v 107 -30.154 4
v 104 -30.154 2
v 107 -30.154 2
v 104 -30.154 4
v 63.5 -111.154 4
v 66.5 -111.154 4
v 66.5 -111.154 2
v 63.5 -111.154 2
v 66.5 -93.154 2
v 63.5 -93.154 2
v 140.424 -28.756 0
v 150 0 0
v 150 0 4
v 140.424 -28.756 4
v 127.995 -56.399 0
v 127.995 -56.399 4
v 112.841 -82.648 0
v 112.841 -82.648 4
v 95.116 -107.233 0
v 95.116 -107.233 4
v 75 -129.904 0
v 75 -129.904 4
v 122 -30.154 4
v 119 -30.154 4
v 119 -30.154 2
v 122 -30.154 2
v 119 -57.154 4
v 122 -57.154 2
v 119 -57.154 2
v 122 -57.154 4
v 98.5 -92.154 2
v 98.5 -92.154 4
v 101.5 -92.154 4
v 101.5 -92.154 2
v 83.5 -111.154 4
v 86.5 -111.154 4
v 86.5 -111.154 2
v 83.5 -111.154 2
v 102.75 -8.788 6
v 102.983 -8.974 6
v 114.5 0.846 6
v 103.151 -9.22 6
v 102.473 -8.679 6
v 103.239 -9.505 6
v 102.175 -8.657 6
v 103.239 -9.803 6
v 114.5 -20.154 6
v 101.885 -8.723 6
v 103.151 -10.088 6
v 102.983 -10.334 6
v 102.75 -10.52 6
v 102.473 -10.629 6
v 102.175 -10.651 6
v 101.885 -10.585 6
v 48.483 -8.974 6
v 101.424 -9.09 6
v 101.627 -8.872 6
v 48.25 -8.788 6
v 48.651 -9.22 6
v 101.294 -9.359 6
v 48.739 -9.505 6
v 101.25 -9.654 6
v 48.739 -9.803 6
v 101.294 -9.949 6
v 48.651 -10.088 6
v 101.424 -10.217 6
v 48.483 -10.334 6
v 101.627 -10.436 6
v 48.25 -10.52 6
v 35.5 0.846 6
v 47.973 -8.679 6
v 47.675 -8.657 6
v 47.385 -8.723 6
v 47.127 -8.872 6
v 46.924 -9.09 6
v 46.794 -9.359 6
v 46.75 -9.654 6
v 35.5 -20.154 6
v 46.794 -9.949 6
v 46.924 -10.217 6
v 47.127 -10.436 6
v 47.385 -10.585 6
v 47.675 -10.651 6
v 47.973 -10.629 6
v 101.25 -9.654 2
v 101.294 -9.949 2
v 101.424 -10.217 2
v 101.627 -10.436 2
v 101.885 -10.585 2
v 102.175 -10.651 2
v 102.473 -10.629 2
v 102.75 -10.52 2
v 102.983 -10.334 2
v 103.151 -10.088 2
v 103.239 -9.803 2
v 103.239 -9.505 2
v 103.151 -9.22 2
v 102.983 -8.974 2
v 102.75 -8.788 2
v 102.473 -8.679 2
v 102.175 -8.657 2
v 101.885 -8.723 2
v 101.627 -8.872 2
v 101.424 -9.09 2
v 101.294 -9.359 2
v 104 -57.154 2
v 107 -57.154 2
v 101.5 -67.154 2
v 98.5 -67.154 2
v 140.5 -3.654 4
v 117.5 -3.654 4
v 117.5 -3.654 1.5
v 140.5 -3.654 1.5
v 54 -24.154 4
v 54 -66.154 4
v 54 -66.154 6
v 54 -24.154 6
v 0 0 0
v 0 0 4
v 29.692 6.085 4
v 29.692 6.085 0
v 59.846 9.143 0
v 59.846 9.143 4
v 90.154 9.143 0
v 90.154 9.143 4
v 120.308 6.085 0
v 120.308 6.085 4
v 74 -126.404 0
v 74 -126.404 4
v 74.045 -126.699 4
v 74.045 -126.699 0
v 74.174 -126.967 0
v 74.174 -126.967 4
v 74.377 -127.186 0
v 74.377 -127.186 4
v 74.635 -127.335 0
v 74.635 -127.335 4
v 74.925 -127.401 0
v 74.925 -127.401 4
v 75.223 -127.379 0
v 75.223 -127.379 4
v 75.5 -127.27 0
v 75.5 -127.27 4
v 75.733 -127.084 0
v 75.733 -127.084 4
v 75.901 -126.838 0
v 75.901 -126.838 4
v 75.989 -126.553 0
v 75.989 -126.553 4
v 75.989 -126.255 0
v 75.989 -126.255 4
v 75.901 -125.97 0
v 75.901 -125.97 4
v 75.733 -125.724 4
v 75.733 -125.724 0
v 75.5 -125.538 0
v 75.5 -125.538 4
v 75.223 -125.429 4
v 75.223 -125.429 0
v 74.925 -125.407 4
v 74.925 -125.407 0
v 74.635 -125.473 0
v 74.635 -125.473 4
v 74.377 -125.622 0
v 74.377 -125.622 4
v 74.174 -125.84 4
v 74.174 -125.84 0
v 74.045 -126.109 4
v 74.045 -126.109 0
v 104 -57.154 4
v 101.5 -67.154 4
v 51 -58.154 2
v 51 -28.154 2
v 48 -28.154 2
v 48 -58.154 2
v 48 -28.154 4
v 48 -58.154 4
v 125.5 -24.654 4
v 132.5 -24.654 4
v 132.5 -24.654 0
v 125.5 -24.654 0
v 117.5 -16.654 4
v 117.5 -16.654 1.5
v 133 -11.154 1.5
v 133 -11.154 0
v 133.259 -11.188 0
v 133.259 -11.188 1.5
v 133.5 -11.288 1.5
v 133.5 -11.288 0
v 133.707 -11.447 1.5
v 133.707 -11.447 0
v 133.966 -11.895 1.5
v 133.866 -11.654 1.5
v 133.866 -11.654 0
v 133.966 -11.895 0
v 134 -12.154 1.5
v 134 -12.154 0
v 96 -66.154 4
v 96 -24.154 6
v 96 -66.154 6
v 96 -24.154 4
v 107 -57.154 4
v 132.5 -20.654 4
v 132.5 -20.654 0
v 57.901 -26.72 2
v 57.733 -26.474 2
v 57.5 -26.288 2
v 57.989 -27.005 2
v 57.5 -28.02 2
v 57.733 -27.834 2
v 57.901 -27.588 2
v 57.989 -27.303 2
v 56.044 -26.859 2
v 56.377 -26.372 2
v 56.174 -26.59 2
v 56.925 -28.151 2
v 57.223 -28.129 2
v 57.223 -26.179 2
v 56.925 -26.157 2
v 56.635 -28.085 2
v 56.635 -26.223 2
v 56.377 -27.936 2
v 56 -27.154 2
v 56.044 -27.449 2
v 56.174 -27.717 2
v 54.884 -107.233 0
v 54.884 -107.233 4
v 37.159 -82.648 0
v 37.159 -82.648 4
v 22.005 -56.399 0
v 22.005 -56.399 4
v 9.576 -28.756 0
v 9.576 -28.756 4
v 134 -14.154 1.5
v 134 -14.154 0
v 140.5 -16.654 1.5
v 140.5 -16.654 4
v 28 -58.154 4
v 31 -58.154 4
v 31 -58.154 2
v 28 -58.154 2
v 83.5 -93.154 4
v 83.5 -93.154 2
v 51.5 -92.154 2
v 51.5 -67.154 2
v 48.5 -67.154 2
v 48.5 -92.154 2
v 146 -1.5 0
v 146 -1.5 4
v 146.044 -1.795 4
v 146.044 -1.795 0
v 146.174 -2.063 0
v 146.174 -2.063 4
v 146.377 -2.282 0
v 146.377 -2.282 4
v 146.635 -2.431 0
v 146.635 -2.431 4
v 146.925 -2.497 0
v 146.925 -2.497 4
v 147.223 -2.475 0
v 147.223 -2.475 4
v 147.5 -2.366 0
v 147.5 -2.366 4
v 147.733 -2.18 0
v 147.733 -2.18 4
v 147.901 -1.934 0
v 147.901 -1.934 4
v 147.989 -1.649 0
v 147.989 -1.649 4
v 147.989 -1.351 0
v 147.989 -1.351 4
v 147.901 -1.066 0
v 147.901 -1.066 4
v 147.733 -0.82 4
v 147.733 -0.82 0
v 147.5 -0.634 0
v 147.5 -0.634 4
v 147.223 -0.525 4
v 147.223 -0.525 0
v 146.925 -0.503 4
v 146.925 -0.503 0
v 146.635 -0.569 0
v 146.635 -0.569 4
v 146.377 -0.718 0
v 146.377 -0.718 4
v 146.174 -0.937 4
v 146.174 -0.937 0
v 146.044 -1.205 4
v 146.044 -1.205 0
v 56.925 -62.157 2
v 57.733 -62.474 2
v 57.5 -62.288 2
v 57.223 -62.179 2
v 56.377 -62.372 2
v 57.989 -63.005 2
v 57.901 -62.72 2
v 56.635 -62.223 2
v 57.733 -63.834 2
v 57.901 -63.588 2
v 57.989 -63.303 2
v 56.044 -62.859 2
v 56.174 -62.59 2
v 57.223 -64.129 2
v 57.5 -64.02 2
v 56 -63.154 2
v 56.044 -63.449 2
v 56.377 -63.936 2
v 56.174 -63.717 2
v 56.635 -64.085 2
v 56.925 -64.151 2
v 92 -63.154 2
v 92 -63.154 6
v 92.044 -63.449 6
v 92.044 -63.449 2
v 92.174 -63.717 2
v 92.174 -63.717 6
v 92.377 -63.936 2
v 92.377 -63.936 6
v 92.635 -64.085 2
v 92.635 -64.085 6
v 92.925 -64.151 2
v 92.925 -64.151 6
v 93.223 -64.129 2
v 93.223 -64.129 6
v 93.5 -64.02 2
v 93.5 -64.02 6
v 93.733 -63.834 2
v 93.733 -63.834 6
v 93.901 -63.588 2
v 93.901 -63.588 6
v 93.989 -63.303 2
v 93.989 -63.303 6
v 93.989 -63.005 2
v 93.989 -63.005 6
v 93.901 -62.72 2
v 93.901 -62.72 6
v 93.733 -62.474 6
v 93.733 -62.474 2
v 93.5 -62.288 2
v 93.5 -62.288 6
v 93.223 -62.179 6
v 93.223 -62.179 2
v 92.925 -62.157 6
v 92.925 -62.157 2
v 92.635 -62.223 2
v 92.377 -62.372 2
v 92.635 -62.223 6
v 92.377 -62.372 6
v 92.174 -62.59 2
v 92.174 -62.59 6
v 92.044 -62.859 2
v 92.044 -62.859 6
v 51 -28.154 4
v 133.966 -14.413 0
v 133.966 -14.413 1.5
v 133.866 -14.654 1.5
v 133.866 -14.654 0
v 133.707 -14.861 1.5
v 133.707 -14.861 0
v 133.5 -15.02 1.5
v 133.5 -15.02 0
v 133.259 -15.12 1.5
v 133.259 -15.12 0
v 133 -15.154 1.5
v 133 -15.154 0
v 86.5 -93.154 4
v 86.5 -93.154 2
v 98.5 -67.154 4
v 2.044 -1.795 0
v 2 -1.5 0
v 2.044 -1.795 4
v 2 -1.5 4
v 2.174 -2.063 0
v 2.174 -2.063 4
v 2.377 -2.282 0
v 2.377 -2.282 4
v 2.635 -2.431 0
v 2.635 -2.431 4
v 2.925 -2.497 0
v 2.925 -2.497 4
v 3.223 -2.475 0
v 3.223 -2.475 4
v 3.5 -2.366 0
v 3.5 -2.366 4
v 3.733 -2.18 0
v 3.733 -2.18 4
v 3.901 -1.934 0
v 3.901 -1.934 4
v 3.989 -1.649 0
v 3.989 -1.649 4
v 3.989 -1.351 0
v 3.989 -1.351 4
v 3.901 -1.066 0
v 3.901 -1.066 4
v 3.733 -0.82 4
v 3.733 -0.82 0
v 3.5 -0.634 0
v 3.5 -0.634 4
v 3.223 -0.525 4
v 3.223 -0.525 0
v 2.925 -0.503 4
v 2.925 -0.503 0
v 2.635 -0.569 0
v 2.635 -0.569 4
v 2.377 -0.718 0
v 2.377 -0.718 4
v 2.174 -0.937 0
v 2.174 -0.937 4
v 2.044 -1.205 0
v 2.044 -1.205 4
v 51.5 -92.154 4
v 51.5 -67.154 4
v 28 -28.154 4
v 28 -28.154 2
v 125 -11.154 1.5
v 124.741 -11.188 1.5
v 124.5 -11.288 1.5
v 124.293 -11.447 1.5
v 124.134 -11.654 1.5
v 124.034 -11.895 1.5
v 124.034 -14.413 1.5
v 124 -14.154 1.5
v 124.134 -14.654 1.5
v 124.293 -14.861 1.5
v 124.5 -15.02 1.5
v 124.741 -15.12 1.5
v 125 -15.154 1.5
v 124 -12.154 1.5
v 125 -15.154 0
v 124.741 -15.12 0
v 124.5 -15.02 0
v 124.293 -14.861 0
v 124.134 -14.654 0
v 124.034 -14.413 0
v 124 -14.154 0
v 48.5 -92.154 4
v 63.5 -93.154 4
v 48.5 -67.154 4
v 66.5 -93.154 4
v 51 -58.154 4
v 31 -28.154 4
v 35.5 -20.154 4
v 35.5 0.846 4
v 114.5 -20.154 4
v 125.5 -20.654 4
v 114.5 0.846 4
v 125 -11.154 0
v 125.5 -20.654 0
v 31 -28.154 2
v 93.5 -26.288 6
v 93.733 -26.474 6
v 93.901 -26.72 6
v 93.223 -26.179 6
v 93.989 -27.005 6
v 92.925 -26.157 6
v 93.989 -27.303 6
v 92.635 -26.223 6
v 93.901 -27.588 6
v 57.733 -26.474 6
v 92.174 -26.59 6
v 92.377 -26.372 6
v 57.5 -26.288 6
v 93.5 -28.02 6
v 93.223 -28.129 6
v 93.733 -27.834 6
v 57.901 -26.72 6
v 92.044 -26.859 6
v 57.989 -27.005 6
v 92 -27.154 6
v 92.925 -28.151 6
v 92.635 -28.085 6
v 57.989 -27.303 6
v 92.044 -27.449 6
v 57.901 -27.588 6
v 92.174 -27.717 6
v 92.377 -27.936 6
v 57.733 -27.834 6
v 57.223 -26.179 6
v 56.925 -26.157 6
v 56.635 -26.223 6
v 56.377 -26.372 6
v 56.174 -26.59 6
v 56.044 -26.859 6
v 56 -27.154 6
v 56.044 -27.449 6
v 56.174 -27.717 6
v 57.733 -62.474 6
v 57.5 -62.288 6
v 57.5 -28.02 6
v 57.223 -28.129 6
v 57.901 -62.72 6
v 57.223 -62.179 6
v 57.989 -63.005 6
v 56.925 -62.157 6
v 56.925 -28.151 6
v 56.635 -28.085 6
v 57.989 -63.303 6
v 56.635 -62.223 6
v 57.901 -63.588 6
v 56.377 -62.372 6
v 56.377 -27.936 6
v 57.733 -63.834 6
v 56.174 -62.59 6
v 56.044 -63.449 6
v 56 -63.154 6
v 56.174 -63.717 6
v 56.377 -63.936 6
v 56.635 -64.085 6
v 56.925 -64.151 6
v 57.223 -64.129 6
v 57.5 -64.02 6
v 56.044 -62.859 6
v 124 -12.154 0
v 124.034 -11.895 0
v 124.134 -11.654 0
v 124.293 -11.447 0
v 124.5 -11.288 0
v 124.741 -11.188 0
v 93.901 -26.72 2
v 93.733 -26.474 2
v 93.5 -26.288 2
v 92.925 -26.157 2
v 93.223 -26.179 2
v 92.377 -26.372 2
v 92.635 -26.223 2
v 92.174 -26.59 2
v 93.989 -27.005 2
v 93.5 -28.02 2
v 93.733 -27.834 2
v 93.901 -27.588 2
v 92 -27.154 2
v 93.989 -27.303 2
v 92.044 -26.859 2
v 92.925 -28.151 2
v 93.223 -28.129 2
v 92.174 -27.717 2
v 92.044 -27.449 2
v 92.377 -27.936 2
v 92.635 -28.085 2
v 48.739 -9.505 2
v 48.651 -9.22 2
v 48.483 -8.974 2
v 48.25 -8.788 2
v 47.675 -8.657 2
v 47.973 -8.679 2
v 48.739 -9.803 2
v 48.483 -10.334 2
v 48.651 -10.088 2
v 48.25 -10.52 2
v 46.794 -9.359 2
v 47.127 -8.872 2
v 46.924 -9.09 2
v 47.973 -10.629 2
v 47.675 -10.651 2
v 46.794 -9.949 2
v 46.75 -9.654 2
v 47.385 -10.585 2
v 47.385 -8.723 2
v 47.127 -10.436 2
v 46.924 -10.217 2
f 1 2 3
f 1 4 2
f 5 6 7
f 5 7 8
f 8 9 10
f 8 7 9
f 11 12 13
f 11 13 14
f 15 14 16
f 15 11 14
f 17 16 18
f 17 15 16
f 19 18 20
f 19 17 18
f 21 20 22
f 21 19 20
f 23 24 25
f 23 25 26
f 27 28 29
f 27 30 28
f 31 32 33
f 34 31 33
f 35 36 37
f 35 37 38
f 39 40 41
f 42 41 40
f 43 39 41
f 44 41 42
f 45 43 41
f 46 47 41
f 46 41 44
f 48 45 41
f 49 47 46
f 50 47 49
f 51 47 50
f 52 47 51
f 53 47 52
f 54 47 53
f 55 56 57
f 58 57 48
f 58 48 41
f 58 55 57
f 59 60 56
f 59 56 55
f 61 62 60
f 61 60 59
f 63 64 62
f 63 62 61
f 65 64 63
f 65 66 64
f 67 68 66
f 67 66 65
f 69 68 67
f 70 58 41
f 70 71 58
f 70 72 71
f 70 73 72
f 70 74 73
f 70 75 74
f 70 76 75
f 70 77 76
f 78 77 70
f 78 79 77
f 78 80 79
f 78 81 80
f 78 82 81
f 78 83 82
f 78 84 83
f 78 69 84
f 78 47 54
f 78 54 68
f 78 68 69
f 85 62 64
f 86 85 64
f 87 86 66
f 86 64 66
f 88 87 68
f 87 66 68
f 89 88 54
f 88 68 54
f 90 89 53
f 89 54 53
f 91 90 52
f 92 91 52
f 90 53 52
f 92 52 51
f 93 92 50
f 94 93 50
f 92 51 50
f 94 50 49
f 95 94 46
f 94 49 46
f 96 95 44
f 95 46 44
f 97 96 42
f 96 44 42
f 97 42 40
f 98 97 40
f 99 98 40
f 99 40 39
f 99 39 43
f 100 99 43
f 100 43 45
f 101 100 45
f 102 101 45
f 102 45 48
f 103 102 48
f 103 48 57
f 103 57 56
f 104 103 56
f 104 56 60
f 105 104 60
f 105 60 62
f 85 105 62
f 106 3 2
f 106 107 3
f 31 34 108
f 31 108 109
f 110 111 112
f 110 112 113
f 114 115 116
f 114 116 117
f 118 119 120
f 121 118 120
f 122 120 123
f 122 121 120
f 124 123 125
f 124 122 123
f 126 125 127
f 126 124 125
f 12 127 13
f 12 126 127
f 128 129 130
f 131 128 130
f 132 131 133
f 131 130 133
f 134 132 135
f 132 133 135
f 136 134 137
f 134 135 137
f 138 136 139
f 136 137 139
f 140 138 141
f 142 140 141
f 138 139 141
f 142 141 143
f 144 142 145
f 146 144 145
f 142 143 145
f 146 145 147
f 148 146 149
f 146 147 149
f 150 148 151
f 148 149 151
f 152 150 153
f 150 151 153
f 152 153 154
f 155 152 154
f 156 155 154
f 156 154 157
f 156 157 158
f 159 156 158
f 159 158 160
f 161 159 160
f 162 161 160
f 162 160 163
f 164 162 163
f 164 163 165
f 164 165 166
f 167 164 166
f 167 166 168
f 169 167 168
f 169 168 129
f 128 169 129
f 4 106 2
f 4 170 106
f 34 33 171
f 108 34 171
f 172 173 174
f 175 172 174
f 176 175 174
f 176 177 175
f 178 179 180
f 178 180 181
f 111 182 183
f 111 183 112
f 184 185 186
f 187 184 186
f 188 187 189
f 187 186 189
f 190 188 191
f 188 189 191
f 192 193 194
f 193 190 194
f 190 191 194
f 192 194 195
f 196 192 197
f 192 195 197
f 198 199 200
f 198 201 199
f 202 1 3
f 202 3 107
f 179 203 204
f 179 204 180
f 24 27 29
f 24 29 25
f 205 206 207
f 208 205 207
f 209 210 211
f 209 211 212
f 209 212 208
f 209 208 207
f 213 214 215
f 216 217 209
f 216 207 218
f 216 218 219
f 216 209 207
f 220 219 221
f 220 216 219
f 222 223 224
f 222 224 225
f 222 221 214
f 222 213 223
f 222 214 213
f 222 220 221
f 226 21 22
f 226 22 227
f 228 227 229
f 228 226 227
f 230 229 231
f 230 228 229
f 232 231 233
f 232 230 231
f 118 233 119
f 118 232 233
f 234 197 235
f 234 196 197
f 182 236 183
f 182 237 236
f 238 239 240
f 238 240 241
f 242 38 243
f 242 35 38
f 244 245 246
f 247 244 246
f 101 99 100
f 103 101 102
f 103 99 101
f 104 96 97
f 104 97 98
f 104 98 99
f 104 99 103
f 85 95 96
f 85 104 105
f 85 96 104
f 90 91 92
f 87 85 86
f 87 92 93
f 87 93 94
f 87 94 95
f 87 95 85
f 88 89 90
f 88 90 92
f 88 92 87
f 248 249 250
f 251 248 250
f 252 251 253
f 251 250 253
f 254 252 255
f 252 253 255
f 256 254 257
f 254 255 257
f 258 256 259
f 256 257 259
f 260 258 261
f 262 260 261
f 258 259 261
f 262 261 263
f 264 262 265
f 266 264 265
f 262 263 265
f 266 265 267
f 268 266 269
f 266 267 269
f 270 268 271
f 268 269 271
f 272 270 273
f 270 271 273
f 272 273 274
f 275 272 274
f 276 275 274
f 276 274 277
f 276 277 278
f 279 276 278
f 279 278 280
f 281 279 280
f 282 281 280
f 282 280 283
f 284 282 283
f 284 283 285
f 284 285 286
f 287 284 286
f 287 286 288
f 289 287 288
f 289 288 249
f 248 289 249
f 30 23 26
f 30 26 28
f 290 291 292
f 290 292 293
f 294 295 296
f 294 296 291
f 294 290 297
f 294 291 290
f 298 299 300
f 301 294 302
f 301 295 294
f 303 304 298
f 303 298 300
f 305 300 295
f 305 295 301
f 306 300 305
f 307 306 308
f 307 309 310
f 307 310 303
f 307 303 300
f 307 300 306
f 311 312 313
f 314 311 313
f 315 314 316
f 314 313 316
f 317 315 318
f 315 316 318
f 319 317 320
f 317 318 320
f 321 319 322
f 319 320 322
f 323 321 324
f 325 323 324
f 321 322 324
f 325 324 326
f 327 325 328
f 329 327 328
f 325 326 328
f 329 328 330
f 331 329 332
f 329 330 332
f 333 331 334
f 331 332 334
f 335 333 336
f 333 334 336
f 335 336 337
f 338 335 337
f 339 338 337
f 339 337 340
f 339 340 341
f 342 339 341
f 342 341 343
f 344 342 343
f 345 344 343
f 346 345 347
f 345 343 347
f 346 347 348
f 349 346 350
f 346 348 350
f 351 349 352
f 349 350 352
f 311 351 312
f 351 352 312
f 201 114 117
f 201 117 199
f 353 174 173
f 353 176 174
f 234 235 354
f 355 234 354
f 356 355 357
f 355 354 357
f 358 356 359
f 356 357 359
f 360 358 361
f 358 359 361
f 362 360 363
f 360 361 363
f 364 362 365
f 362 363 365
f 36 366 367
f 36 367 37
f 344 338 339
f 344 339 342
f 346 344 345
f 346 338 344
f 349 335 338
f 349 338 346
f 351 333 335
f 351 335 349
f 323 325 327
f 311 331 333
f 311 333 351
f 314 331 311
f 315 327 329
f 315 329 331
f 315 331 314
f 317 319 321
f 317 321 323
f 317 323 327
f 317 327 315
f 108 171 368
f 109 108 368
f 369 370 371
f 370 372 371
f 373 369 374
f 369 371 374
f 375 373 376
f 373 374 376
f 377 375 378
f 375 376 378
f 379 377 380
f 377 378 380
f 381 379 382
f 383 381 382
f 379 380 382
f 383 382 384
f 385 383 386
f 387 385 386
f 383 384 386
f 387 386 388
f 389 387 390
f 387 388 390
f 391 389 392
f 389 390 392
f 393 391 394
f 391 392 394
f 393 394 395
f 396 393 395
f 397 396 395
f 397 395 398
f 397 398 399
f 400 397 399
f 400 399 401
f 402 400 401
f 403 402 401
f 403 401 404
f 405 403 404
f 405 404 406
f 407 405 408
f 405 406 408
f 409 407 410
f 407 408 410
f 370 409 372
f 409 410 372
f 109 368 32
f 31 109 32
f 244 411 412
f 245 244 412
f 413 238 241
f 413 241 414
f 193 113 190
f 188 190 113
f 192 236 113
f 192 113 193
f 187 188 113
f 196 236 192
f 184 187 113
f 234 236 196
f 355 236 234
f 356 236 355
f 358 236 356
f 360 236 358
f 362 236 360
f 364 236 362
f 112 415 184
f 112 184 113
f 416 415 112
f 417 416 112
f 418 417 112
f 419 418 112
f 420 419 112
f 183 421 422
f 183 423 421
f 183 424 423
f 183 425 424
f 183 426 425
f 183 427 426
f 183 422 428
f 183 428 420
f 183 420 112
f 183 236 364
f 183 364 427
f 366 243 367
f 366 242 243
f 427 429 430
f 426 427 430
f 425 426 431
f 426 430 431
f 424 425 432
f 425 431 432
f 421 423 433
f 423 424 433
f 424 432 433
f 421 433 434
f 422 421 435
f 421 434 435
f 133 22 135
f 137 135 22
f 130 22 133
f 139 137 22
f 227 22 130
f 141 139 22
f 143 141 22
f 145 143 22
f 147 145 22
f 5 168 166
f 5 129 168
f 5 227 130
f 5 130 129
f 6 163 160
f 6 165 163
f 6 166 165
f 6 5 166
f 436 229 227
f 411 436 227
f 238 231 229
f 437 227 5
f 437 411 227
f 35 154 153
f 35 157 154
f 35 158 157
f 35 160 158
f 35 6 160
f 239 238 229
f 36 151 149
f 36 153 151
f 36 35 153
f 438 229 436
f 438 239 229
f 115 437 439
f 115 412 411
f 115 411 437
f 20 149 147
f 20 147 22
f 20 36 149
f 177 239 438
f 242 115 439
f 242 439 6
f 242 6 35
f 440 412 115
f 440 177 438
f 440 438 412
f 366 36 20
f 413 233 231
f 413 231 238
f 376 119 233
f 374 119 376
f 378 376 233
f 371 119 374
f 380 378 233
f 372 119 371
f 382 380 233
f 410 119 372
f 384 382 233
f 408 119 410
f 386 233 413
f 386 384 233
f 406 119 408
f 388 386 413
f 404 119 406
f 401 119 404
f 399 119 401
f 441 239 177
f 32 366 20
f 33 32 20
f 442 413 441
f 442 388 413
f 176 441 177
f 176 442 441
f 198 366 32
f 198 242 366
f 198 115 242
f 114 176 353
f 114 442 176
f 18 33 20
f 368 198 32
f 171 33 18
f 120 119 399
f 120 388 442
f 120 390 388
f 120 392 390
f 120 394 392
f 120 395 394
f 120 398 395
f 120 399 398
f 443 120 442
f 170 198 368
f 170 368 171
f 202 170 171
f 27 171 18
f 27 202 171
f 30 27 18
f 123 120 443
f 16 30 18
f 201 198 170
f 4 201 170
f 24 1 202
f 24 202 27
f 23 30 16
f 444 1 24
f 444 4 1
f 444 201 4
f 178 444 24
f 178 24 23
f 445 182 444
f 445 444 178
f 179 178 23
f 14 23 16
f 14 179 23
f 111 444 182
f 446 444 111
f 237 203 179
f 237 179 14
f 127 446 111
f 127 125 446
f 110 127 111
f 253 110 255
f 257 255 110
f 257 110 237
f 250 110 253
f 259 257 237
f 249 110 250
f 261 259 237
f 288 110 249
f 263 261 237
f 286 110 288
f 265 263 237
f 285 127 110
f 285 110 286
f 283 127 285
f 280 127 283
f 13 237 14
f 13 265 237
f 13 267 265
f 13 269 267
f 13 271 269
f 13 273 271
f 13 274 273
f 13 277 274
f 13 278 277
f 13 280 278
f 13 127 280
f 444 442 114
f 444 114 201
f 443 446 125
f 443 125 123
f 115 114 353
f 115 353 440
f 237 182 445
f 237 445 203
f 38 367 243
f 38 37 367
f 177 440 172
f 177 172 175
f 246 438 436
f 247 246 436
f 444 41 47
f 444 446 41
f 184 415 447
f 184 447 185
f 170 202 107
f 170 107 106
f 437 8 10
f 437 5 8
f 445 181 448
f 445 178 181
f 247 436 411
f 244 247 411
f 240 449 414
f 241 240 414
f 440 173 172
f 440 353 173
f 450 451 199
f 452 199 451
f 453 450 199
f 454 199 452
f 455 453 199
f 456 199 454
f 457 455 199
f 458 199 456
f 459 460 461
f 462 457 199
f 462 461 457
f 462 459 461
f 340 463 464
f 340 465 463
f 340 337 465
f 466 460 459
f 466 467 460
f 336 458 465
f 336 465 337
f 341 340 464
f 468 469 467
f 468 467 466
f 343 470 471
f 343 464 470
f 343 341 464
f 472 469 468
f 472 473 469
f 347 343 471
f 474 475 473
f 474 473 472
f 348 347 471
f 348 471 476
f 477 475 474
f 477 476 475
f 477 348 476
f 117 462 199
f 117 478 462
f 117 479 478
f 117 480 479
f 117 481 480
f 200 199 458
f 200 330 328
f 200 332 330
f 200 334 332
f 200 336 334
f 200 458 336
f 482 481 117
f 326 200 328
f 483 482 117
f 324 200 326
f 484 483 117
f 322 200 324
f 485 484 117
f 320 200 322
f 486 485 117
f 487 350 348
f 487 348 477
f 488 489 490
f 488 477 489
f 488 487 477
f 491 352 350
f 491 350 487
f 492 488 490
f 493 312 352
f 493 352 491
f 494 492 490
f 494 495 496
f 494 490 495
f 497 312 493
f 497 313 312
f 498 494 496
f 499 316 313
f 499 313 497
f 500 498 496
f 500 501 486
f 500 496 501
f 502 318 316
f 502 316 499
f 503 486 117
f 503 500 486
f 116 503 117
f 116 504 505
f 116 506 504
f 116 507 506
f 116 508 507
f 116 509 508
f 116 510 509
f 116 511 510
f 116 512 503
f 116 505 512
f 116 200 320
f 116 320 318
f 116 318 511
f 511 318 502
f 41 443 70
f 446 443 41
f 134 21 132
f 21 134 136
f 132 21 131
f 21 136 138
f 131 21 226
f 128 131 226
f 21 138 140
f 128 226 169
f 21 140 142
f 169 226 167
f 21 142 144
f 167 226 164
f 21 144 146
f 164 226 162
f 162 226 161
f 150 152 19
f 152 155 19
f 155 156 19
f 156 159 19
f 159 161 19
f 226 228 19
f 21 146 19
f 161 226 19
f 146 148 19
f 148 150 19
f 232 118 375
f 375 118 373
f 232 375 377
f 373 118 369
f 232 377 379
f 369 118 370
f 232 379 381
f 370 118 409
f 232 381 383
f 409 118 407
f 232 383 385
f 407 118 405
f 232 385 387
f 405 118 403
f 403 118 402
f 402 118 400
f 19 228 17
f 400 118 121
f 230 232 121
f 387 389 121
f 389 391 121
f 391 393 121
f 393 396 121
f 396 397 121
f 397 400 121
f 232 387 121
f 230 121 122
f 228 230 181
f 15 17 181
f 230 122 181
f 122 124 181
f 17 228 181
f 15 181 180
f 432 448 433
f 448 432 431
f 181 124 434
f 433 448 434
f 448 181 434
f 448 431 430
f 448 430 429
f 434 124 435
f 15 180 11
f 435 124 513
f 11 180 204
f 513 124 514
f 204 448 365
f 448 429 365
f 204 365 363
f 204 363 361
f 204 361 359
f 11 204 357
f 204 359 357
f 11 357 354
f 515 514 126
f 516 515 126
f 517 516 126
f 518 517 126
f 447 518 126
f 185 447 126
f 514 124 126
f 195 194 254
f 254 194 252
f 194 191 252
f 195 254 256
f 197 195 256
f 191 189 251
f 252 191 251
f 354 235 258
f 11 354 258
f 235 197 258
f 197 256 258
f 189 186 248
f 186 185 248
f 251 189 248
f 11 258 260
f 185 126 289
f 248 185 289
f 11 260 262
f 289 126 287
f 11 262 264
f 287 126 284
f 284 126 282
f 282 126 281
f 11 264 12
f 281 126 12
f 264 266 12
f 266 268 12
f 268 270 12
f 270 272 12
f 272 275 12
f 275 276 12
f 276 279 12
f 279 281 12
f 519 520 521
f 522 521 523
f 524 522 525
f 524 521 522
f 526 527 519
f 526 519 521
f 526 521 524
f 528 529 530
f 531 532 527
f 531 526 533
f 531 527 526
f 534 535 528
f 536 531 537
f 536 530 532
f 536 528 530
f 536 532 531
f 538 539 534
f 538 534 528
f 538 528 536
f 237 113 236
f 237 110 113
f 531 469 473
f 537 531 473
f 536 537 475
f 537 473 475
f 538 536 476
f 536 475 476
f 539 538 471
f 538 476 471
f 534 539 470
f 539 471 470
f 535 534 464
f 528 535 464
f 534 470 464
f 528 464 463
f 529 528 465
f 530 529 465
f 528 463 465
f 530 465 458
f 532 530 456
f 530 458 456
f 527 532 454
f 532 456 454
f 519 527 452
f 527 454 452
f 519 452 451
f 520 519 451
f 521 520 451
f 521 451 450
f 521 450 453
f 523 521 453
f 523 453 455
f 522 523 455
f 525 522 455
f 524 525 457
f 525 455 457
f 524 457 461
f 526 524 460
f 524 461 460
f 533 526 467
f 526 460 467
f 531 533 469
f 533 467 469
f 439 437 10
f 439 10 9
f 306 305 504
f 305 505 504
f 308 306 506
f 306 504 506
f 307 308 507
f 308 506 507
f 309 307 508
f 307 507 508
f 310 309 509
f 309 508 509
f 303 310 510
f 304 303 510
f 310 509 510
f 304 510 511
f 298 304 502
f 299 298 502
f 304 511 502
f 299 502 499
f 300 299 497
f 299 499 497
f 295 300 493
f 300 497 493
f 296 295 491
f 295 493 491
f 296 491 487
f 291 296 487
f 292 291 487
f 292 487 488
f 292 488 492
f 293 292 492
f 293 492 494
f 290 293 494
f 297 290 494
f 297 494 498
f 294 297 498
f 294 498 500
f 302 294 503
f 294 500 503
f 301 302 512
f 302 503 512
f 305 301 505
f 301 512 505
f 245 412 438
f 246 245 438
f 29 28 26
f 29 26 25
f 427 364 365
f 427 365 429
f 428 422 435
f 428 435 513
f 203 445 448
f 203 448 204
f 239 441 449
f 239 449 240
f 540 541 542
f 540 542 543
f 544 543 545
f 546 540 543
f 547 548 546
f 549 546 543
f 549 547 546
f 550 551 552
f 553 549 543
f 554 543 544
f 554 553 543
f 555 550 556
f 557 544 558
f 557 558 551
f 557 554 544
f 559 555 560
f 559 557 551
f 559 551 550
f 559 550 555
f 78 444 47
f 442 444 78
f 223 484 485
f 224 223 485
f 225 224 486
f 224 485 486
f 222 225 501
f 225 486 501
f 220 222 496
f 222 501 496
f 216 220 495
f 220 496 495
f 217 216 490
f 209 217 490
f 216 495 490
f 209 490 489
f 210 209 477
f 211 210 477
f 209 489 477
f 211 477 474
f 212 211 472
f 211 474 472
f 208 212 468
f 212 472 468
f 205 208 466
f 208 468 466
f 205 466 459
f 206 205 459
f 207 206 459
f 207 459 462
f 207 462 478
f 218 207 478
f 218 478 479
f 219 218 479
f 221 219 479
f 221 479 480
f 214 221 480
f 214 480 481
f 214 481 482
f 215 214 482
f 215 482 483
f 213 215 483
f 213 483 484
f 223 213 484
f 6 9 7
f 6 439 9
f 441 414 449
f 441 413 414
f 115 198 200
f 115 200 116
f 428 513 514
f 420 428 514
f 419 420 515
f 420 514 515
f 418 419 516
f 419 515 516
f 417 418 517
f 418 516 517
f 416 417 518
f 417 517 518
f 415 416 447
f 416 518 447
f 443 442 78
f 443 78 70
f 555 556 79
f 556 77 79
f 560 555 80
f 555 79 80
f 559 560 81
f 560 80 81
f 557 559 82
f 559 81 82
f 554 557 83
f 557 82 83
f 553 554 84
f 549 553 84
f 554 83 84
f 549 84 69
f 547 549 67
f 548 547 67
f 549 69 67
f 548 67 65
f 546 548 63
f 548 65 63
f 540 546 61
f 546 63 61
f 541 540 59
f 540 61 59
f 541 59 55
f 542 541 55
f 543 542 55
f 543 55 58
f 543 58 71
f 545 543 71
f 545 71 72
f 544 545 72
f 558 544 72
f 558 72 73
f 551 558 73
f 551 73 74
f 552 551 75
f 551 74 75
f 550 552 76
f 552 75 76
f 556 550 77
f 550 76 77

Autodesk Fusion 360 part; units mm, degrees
sketch "Base" plane through (0, 0, 0) normal (0, 0, 1) x (1, 0, 0)
  line L0 (0, 0) -> (150, 0)
  line L1 (150, 0) -> (75, -129.9038)
  line L2 (75, -129.9038) -> (0, 0)
  arc A0 (150, 0) -> (0, 0) centre (75, -290.4738) ccw
  arc A1 (0, 0) -> (75, -129.9038) centre (289.0576, 80.285) ccw
  arc A2 (75, -129.9038) -> (150, 0) centre (-139.0576, 80.285) ccw
  dimension "d1" = 150
  dimension "d2" = 150
  dimension "d3" = 150
  dimension "d4" = 300
  dimension "d5" = 300
  dimension "d6" = 300
extrude "Extrude1" add sketch "Base" along normal blind 4
sketch "Pads" plane through (0, 0, 4) normal (0, 0, 1) x (-1, 0, 0)
  arc A0 (-75, 129.9038) -> (-150, 0) centre (139.0576, -80.285) ccw
  arc A1 (-150, 0) -> (0, 0) centre (-75, 290.4738) ccw
  arc A2 (0, 0) -> (-75, 129.9038) centre (-289.0576, -80.285) ccw
  line L0 (-54, 24.1538) -> (-96, 24.1538)
  line L1 (-96, 24.1538) -> (-96, 66.1538)
  line L2 (-96, 66.1538) -> (-54, 66.1538)
  line L3 (-54, 66.1538) -> (-54, 24.1538)
  line L4 (-114.5, 20.1538) -> (-35.5, 20.1538)
  line L5 (-35.5, 20.1538) -> (-35.5, -0.8462)
  line L6 (-35.5, -0.8462) -> (-114.5, -0.8462)
  line L7 (-114.5, -0.8462) -> (-114.5, 20.1538)
  dimension "d478" = 42
  dimension "d479" = 42
  dimension "d480" = 63.75
  dimension "d481" = 54
  dimension "d496" = 79
  dimension "d497" = 21
  dimension "d498" = 18.5
  dimension "d499" = 4
extrude "Extrude46" add sketch "Pads" along normal blind 2 contours L0 L1 L2 L3 | L4 L5 L6 L7
sketch "Clip holes" plane through (0, 0, 4) normal (0, 0, 1) x (-1, 0, 0)
  line L0 (-54, 24.1541) -> (-96, 24.1541)
  line L1 (-96, 24.1541) -> (-96, 66.1541)
  line L2 (-96, 66.1541) -> (-54, 66.1541)
  line L3 (-54, 66.1541) -> (-54, 24.1541)
  circle A0 centre (-3, 1.5) radius 0.75
  circle A1 centre (-147, 1.5) radius 0.75
  circle A2 centre (-75, 126.4038) radius 0.75
  arc A3 (-75, 129.9038) -> (-150, 0) centre (139.0576, -80.285) ccw
  arc A4 (-150, 0) -> (0, 0) centre (-75, 290.4738) ccw
  arc A5 (0, 0) -> (-75, 129.9038) centre (-289.0576, -80.285) ccw
  line L4 (-48.5, 92.1541) -> (-51.5, 92.1541)
  line L5 (-51.5, 92.1541) -> (-51.5, 67.1541)
  line L6 (-51.5, 67.1541) -> (-48.5, 67.1541)
  line L7 (-48.5, 67.1541) -> (-48.5, 92.1541)
  line L8 (-98.5, 92.1541) -> (-101.5, 92.1541)
  line L9 (-101.5, 92.1541) -> (-101.5, 67.1541)
  line L10 (-101.5, 67.1541) -> (-98.5, 67.1541)
  line L11 (-98.5, 67.1541) -> (-98.5, 92.1541)
  arc A6 (-75, 129.9038) -> (-150, 0) centre (139.0576, -80.285) ccw
  arc A7 (-150, 0) -> (0, 0) centre (-75, 290.4738) ccw
  arc A8 (0, 0) -> (-75, 129.9038) centre (-289.0576, -80.285) ccw
  line L12 (-66.5, 111.1541) -> (-63.5, 111.1541)
  line L13 (-63.5, 111.1541) -> (-63.5, 93.1541)
  line L14 (-63.5, 93.1541) -> (-66.5, 93.1541)
  line L15 (-66.5, 93.1541) -> (-66.5, 111.1541)
  line L16 (-83.5, 93.1541) -> (-86.5, 93.1541)
  line L17 (-86.5, 93.1541) -> (-86.5, 111.1541)
  line L18 (-86.5, 111.1541) -> (-83.5, 111.1541)
  line L19 (-83.5, 111.1541) -> (-83.5, 93.1541)
  line L20 (-28, 58.1538) -> (-28, 28.1538)
  line L21 (-28, 28.1538) -> (-31, 28.1538)
  line L22 (-31, 58.1538) -> (-28, 58.1538)
  line L23 (-31, 28.1538) -> (-31, 58.1538)
  line L24 (-54, 66.1538) -> (-54, 24.1538)
  line L25 (-54, 24.1538) -> (-96, 24.1538)
  line L26 (-96, 24.1538) -> (-96, 66.1538)
  line L27 (-96, 66.1538) -> (-54, 66.1538)
  line L28 (-114.5, -0.8462) -> (-114.5, 20.1538)
  line L29 (-114.5, 20.1538) -> (-35.5, 20.1538)
  line L30 (-35.5, 20.1538) -> (-35.5, -0.8462)
  line L31 (-35.5, -0.8462) -> (-114.5, -0.8462)
  line L32 (-104, 30.1538) -> (-107, 30.1538)
  line L33 (-107, 30.1538) -> (-107, 57.1538)
  line L34 (-107, 57.1538) -> (-104, 57.1538)
  line L35 (-104, 57.1538) -> (-104, 30.1538)
  line L36 (-119, 30.1538) -> (-122, 30.1538)
  line L37 (-122, 30.1538) -> (-122, 57.1538)
  line L38 (-122, 57.1538) -> (-119, 57.1538)
  line L39 (-119, 57.1538) -> (-119, 30.1538)
  line L40 (-48, 28.1538) -> (-51, 28.1538)
  line L41 (-51, 28.1538) -> (-51, 58.1538)
  line L42 (-51, 58.1538) -> (-48, 58.1538)
  line L43 (-48, 58.1538) -> (-48, 28.1538)
  line L44 (-96, 24.1538) -> (-54, 24.1538)
  dimension "d427" = 25
  dimension "d428" = 25
  dimension "d468" = 18
  dimension "d469" = 3
  dimension "d471" = 3
  dimension "d472" = 18
  dimension "d474" = 30
  dimension "d475" = 3
  dimension "d559" = 3
  dimension "d560" = 3
  dimension "d561" = 3
  dimension "d562" = 27
  dimension "d563" = 10
  dimension "d564" = 3
  dimension "d565" = 27
  dimension "d566" = 10
  dimension "d567" = 18
  dimension "d568" = 8
  dimension "d569" = 23
  dimension "d570" = 1
  dimension "d571" = 1
  dimension "d572" = 1
  dimension "d573" = 53
  dimension "d574" = 2.5
  dimension "d575" = 1
  dimension "d579" = 3
  dimension "d580" = 30
  dimension "d581" = 23
  dimension "d583" = 4
  dimension "d584" = 4
  dimension "d585" = 3
  dimension "d586" = 12
extrude "Extrude39" cut sketch "Clip holes" against normal blind 2 contours L4 L5 L6 L7 | L8 L9 L10 L11 | L12 L13 L14 L15 | L16 L17 L18 L19 | L20 L21 L22 L23 | L32 L33 L34 L35 | L36 L37 L38 L39 | L40 L41 L42 L43
sketch "Charger" plane through (0, 0, 4) normal (0, 0, 1) x (-1, 0, 0)
  arc A0 (-75, 129.9038) -> (-150, 0) centre (139.0576, -80.285) ccw
  arc A1 (-150, 0) -> (0, 0) centre (-75, 290.4738) ccw
  arc A2 (0, 0) -> (-75, 129.9038) centre (-289.0576, -80.285) ccw
  line L0 (-54, 24.1538) -> (-96, 24.1538)
  line L1 (-96, 24.1538) -> (-96, 66.1538)
  line L2 (-96, 66.1538) -> (-54, 66.1538)
  line L3 (-54, 66.1538) -> (-54, 24.1538)
  line L4 (-114.5, -0.8462) -> (-114.5, 20.1538)
  line L5 (-114.5, 20.1538) -> (-35.5, 20.1538)
  line L6 (-35.5, 20.1538) -> (-35.5, -0.8462)
  line L7 (-35.5, -0.8462) -> (-114.5, -0.8462)
  line L8 (-86.5, 93.1541) -> (-86.5, 111.1541)
  line L9 (-86.5, 111.1541) -> (-83.5, 111.1541)
  line L10 (-83.5, 111.1541) -> (-83.5, 93.1541)
  line L11 (-83.5, 93.1541) -> (-86.5, 93.1541)
  line L12 (-51.5, 92.1541) -> (-48.5, 92.1541)
  line L13 (-48.5, 92.1541) -> (-48.5, 67.1541)
  line L14 (-48.5, 67.1541) -> (-51.5, 67.1541)
  line L15 (-51.5, 67.1541) -> (-51.5, 92.1541)
  line L16 (-28, 58.1538) -> (-28, 28.1538)
  line L17 (-28, 28.1538) -> (-31, 28.1538)
  line L18 (-31, 28.1538) -> (-31, 58.1538)
  line L19 (-31, 58.1538) -> (-28, 58.1538)
  line L20 (-63.5, 111.1541) -> (-63.5, 93.1541)
  line L21 (-63.5, 93.1541) -> (-66.5, 93.1541)
  line L22 (-66.5, 93.1541) -> (-66.5, 111.1541)
  line L23 (-66.5, 111.1541) -> (-63.5, 111.1541)
  line L24 (-101.5, 92.1541) -> (-98.5, 92.1541)
  line L25 (-98.5, 92.1541) -> (-98.5, 67.1541)
  line L26 (-98.5, 67.1541) -> (-101.5, 67.1541)
  line L27 (-101.5, 67.1541) -> (-101.5, 92.1541)
  line L28 (-117.5, 3.6538) -> (-140.5, 3.6538)
  line L29 (-140.5, 3.6538) -> (-140.5, 16.6538)
  line L30 (-140.5, 16.6538) -> (-117.5, 16.6538)
  line L31 (-117.5, 16.6538) -> (-117.5, 3.6538)
  line L32 (-122, 30.1538) -> (-122, 57.1538)
  line L33 (-122, 57.1538) -> (-119, 57.1538)
  line L34 (-119, 57.1538) -> (-119, 30.1538)
  line L35 (-119, 30.1538) -> (-122, 30.1538)
  line L36 (-107, 30.1538) -> (-107, 57.1538)
  line L37 (-107, 57.1538) -> (-104, 57.1538)
  line L38 (-104, 57.1538) -> (-104, 30.1538)
  line L39 (-104, 30.1538) -> (-107, 30.1538)
  line L40 (-51, 28.1538) -> (-51, 58.1538)
  line L41 (-51, 58.1538) -> (-48, 58.1538)
  line L42 (-48, 58.1538) -> (-48, 28.1538)
  line L43 (-48, 28.1538) -> (-51, 28.1538)
  dimension "d539" = 23
  dimension "d540" = 13
  dimension "d541" = 3
  dimension "d542" = 4.5
extrude "Extrude56" cut sketch "Charger" against normal blind 2.5 contours L28 L29 L30 L31
sketch "Switch" plane through (0, 0, 4) normal (0, 0, 1) x (-1, 0, 0)
  line L0 (-101.5, 92.1541) -> (-98.5, 92.1541)
  line L1 (-98.5, 92.1541) -> (-98.5, 67.1541)
  line L2 (-98.5, 67.1541) -> (-101.5, 67.1541)
  line L3 (-101.5, 67.1541) -> (-101.5, 92.1541)
  line L4 (-63.5, 111.1541) -> (-63.5, 93.1541)
  line L5 (-63.5, 93.1541) -> (-66.5, 93.1541)
  line L6 (-66.5, 93.1541) -> (-66.5, 111.1541)
  line L7 (-66.5, 111.1541) -> (-63.5, 111.1541)
  line L8 (-28, 58.1538) -> (-28, 28.1538)
  line L9 (-28, 28.1538) -> (-31, 28.1538)
  line L10 (-31, 28.1538) -> (-31, 58.1538)
  line L11 (-31, 58.1538) -> (-28, 58.1538)
  line L12 (-51.5, 92.1541) -> (-48.5, 92.1541)
  line L13 (-48.5, 92.1541) -> (-48.5, 67.1541)
  line L14 (-48.5, 67.1541) -> (-51.5, 67.1541)
  line L15 (-51.5, 67.1541) -> (-51.5, 92.1541)
  line L16 (-86.5, 93.1541) -> (-86.5, 111.1541)
  line L17 (-86.5, 111.1541) -> (-83.5, 111.1541)
  line L18 (-83.5, 111.1541) -> (-83.5, 93.1541)
  line L19 (-83.5, 93.1541) -> (-86.5, 93.1541)
  line L20 (-114.5, -0.8462) -> (-114.5, 20.1538)
  line L21 (-114.5, 20.1538) -> (-35.5, 20.1538)
  line L22 (-35.5, 20.1538) -> (-35.5, -0.8462)
  line L23 (-35.5, -0.8462) -> (-114.5, -0.8462)
  line L24 (-54, 24.1538) -> (-96, 24.1538)
  line L25 (-96, 24.1538) -> (-96, 66.1538)
  line L26 (-96, 66.1538) -> (-54, 66.1538)
  line L27 (-54, 66.1538) -> (-54, 24.1538)
  arc A0 (-75, 129.9038) -> (-150, 0) centre (139.0576, -80.285) ccw
  arc A1 (-150, 0) -> (0, 0) centre (-75, 290.4738) ccw
  arc A2 (0, 0) -> (-75, 129.9038) centre (-289.0576, -80.285) ccw
  line L28 (-140.5, 3.6538) -> (-140.5, 16.6538)
  line L29 (-140.5, 16.6538) -> (-117.5, 16.6538)
  line L30 (-117.5, 16.6538) -> (-117.5, 3.6538)
  line L31 (-117.5, 3.6538) -> (-140.5, 3.6538)
  line L32 (-125.5, 20.6538) -> (-132.5, 20.6538)
  line L33 (-132.5, 20.6538) -> (-132.5, 24.6538)
  line L34 (-132.5, 24.6538) -> (-125.5, 24.6538)
  line L35 (-125.5, 24.6538) -> (-125.5, 20.6538)
  line L36 (-107, 30.1538) -> (-107, 57.1538)
  line L37 (-107, 57.1538) -> (-104, 57.1538)
  line L38 (-104, 57.1538) -> (-104, 30.1538)
  line L39 (-104, 30.1538) -> (-107, 30.1538)
  line L40 (-122, 30.1538) -> (-122, 57.1538)
  line L41 (-122, 57.1538) -> (-119, 57.1538)
  line L42 (-119, 57.1538) -> (-119, 30.1538)
  line L43 (-119, 30.1538) -> (-122, 30.1538)
  line L44 (-51, 28.1538) -> (-51, 58.1538)
  line L45 (-51, 58.1538) -> (-48, 58.1538)
  line L46 (-48, 58.1538) -> (-48, 28.1538)
  line L47 (-48, 28.1538) -> (-51, 28.1538)
  dimension "d545" = 7
  dimension "d546" = 4
  dimension "d547" = 4
  dimension "d548" = 8
extrude "Extrude57" cut sketch "Switch" against normal blind 4 contours L32 L33 L34 L35
sketch "Charger hole" plane through (0, 0, 1.5) normal (0, 0, 1) x (-1, 0, 0)
  line L0 (-117.5, 16.6538) -> (-140.5, 16.6538)
  line L1 (-140.5, 16.6538) -> (-140.5, 3.6538)
  line L2 (-140.5, 3.6538) -> (-117.5, 3.6538)
  line L3 (-117.5, 3.6538) -> (-117.5, 16.6538)
  line L4 (-124, 11.1538) -> (-134, 11.1538)
  line L5 (-134, 11.1538) -> (-134, 15.1538)
  line L6 (-134, 15.1538) -> (-124, 15.1538)
  line L7 (-124, 15.1538) -> (-124, 11.1538)
  dimension "d551" = 10
  dimension "d552" = 4
  dimension "d554" = 6.5
  dimension "d617" = 1.5
extrude "Extrude58" cut sketch "Charger hole" against normal blind 1.5 contours L4 L5 L6 L7
fillet "Fillet10" radius 1 4 edges at (124, -11.1538, 0.75) (124, -15.1538, 0.75) (134, -15.1538, 0.75) (134, -11.1538, 0.75)
sketch "Motor holes" plane through (0, 0, 6) normal (0, 0, 1) x (-1, 0, 0)
  line L0 (-54, 66.1538) -> (-96, 66.1538)
  line L1 (-96, 66.1538) -> (-96, 24.1538)
  line L2 (-96, 24.1538) -> (-54, 24.1538)
  line L3 (-54, 24.1538) -> (-54, 66.1538)
  circle A0 centre (-57, 27.1538) radius 1
  circle A1 centre (-93, 27.1538) radius 1
  circle A2 centre (-93, 63.1538) radius 1
  circle A3 centre (-57, 63.1538) radius 1
  dimension "d587" = 2
  dimension "d588" = 3
  dimension "d589" = 3
  dimension "d590" = 2
  dimension "d591" = 3
  dimension "d592" = 3
  dimension "d593" = 2
  dimension "d594" = 3
  dimension "d595" = 3
  dimension "d596" = 2
  dimension "d597" = 3
  dimension "d598" = 3
sketch "Battery holes" plane through (0, 0, 6) normal (0, 0, 1) x (-1, 0, 0)
  line L0 (-114.5, -0.8462) -> (-35.5, -0.8462)
  line L1 (-35.5, -0.8462) -> (-35.5, 20.1538)
  line L2 (-35.5, 20.1538) -> (-114.5, 20.1538)
  line L3 (-114.5, 20.1538) -> (-114.5, -0.8462)
  circle A0 centre (-47.75, 9.6538) radius 1
  circle A1 centre (-102.25, 9.6538) radius 1
  dimension "d599" = 2
  dimension "d600" = 2
  dimension "d601" = 10.5
  dimension "d602" = 10.5
  dimension "d603" = 54.5
  dimension "d604" = 12.25
extrude "Extrude59" cut sketch "Battery holes" sketch "Motor holes" against normal blind 4 contours A0 | A1 of sketch 2 contours A0 | A1 | A2 | A3
sketch "Case holes" plane through (0, 0, 4) normal (0, 0, 1) x (-1, 0, 0)
  line L0 (-140.5, 3.6538) -> (-140.5, 16.6538)
  line L1 (-140.5, 16.6538) -> (-117.5, 16.6538)
  line L2 (-117.5, 16.6538) -> (-117.5, 3.6538)
  line L3 (-117.5, 3.6538) -> (-140.5, 3.6538)
  arc A0 (-75, 129.9038) -> (-150, 0) centre (139.0576, -80.285) ccw
  arc A1 (-150, 0) -> (0, 0) centre (-75, 290.4738) ccw
  arc A2 (0, 0) -> (-75, 129.9038) centre (-289.0576, -80.285) ccw
  line L4 (-54, 66.1538) -> (-54, 24.1538)
  line L5 (-54, 24.1538) -> (-96, 24.1538)
  line L6 (-96, 24.1538) -> (-96, 66.1538)
  line L7 (-96, 66.1538) -> (-54, 66.1538)
  line L8 (-114.5, -0.8462) -> (-114.5, 20.1538)
  line L9 (-114.5, 20.1538) -> (-35.5, 20.1538)
  line L10 (-35.5, 20.1538) -> (-35.5, -0.8462)
  line L11 (-35.5, -0.8462) -> (-114.5, -0.8462)
  line L12 (-51, 28.1538) -> (-51, 58.1538)
  line L13 (-51, 58.1538) -> (-48, 58.1538)
  line L14 (-48, 58.1538) -> (-48, 28.1538)
  line L15 (-48, 28.1538) -> (-51, 28.1538)
  line L16 (-63.5, 111.1541) -> (-63.5, 93.1541)
  line L17 (-63.5, 93.1541) -> (-66.5, 93.1541)
  line L18 (-66.5, 93.1541) -> (-66.5, 111.1541)
  line L19 (-66.5, 111.1541) -> (-63.5, 111.1541)
  line L20 (-101.5, 92.1541) -> (-98.5, 92.1541)
  line L21 (-98.5, 92.1541) -> (-98.5, 67.1541)
  line L22 (-98.5, 67.1541) -> (-101.5, 67.1541)
  line L23 (-101.5, 67.1541) -> (-101.5, 92.1541)
  line L24 (-86.5, 93.1541) -> (-86.5, 111.1541)
  line L25 (-86.5, 111.1541) -> (-83.5, 111.1541)
  line L26 (-83.5, 111.1541) -> (-83.5, 93.1541)
  line L27 (-83.5, 93.1541) -> (-86.5, 93.1541)
  line L28 (-122, 30.1538) -> (-122, 57.1538)
  line L29 (-122, 57.1538) -> (-119, 57.1538)
  line L30 (-119, 57.1538) -> (-119, 30.1538)
  line L31 (-119, 30.1538) -> (-122, 30.1538)
  line L32 (-28, 58.1538) -> (-28, 28.1538)
  line L33 (-28, 28.1538) -> (-31, 28.1538)
  line L34 (-31, 28.1538) -> (-31, 58.1538)
  line L35 (-31, 58.1538) -> (-28, 58.1538)
  line L36 (-51.5, 92.1541) -> (-48.5, 92.1541)
  line L37 (-48.5, 92.1541) -> (-48.5, 67.1541)
  line L38 (-48.5, 67.1541) -> (-51.5, 67.1541)
  line L39 (-51.5, 67.1541) -> (-51.5, 92.1541)
  line L40 (-107, 30.1538) -> (-107, 57.1538)
  line L41 (-107, 57.1538) -> (-104, 57.1538)
  line L42 (-104, 57.1538) -> (-104, 30.1538)
  line L43 (-104, 30.1538) -> (-107, 30.1538)
  line L44 (-132.5, 20.6538) -> (-132.5, 24.6538)
  line L45 (-132.5, 24.6538) -> (-125.5, 24.6538)
  line L46 (-125.5, 24.6538) -> (-125.5, 20.6538)
  line L47 (-125.5, 20.6538) -> (-132.5, 20.6538)
  circle A3 centre (-75.0001, 126.4038) radius 1
  circle A4 centre (-3, 1.5) radius 1
  circle A5 centre (-147, 1.5) radius 1
  dimension "d607" = 2
  dimension "d608" = 2
  dimension "d609" = 3
  dimension "d610" = 1.5
  dimension "d611" = 2
  dimension "d612" = 3
  dimension "d613" = 1.5
  dimension "d614" = 3.5
extrude "Extrude60" cut sketch "Case holes" against normal blind 4 contours A3 | A4 | A5
equation "CLIP_PCB_SIZE = 16 mm"
equation "CLIP_PCB_THICKNESS = 1 mm"
equation "CLIP_DISTANCE_TO_BASE = 7 mm"
equation "CLIP_THICKNESS = 4 mm"
